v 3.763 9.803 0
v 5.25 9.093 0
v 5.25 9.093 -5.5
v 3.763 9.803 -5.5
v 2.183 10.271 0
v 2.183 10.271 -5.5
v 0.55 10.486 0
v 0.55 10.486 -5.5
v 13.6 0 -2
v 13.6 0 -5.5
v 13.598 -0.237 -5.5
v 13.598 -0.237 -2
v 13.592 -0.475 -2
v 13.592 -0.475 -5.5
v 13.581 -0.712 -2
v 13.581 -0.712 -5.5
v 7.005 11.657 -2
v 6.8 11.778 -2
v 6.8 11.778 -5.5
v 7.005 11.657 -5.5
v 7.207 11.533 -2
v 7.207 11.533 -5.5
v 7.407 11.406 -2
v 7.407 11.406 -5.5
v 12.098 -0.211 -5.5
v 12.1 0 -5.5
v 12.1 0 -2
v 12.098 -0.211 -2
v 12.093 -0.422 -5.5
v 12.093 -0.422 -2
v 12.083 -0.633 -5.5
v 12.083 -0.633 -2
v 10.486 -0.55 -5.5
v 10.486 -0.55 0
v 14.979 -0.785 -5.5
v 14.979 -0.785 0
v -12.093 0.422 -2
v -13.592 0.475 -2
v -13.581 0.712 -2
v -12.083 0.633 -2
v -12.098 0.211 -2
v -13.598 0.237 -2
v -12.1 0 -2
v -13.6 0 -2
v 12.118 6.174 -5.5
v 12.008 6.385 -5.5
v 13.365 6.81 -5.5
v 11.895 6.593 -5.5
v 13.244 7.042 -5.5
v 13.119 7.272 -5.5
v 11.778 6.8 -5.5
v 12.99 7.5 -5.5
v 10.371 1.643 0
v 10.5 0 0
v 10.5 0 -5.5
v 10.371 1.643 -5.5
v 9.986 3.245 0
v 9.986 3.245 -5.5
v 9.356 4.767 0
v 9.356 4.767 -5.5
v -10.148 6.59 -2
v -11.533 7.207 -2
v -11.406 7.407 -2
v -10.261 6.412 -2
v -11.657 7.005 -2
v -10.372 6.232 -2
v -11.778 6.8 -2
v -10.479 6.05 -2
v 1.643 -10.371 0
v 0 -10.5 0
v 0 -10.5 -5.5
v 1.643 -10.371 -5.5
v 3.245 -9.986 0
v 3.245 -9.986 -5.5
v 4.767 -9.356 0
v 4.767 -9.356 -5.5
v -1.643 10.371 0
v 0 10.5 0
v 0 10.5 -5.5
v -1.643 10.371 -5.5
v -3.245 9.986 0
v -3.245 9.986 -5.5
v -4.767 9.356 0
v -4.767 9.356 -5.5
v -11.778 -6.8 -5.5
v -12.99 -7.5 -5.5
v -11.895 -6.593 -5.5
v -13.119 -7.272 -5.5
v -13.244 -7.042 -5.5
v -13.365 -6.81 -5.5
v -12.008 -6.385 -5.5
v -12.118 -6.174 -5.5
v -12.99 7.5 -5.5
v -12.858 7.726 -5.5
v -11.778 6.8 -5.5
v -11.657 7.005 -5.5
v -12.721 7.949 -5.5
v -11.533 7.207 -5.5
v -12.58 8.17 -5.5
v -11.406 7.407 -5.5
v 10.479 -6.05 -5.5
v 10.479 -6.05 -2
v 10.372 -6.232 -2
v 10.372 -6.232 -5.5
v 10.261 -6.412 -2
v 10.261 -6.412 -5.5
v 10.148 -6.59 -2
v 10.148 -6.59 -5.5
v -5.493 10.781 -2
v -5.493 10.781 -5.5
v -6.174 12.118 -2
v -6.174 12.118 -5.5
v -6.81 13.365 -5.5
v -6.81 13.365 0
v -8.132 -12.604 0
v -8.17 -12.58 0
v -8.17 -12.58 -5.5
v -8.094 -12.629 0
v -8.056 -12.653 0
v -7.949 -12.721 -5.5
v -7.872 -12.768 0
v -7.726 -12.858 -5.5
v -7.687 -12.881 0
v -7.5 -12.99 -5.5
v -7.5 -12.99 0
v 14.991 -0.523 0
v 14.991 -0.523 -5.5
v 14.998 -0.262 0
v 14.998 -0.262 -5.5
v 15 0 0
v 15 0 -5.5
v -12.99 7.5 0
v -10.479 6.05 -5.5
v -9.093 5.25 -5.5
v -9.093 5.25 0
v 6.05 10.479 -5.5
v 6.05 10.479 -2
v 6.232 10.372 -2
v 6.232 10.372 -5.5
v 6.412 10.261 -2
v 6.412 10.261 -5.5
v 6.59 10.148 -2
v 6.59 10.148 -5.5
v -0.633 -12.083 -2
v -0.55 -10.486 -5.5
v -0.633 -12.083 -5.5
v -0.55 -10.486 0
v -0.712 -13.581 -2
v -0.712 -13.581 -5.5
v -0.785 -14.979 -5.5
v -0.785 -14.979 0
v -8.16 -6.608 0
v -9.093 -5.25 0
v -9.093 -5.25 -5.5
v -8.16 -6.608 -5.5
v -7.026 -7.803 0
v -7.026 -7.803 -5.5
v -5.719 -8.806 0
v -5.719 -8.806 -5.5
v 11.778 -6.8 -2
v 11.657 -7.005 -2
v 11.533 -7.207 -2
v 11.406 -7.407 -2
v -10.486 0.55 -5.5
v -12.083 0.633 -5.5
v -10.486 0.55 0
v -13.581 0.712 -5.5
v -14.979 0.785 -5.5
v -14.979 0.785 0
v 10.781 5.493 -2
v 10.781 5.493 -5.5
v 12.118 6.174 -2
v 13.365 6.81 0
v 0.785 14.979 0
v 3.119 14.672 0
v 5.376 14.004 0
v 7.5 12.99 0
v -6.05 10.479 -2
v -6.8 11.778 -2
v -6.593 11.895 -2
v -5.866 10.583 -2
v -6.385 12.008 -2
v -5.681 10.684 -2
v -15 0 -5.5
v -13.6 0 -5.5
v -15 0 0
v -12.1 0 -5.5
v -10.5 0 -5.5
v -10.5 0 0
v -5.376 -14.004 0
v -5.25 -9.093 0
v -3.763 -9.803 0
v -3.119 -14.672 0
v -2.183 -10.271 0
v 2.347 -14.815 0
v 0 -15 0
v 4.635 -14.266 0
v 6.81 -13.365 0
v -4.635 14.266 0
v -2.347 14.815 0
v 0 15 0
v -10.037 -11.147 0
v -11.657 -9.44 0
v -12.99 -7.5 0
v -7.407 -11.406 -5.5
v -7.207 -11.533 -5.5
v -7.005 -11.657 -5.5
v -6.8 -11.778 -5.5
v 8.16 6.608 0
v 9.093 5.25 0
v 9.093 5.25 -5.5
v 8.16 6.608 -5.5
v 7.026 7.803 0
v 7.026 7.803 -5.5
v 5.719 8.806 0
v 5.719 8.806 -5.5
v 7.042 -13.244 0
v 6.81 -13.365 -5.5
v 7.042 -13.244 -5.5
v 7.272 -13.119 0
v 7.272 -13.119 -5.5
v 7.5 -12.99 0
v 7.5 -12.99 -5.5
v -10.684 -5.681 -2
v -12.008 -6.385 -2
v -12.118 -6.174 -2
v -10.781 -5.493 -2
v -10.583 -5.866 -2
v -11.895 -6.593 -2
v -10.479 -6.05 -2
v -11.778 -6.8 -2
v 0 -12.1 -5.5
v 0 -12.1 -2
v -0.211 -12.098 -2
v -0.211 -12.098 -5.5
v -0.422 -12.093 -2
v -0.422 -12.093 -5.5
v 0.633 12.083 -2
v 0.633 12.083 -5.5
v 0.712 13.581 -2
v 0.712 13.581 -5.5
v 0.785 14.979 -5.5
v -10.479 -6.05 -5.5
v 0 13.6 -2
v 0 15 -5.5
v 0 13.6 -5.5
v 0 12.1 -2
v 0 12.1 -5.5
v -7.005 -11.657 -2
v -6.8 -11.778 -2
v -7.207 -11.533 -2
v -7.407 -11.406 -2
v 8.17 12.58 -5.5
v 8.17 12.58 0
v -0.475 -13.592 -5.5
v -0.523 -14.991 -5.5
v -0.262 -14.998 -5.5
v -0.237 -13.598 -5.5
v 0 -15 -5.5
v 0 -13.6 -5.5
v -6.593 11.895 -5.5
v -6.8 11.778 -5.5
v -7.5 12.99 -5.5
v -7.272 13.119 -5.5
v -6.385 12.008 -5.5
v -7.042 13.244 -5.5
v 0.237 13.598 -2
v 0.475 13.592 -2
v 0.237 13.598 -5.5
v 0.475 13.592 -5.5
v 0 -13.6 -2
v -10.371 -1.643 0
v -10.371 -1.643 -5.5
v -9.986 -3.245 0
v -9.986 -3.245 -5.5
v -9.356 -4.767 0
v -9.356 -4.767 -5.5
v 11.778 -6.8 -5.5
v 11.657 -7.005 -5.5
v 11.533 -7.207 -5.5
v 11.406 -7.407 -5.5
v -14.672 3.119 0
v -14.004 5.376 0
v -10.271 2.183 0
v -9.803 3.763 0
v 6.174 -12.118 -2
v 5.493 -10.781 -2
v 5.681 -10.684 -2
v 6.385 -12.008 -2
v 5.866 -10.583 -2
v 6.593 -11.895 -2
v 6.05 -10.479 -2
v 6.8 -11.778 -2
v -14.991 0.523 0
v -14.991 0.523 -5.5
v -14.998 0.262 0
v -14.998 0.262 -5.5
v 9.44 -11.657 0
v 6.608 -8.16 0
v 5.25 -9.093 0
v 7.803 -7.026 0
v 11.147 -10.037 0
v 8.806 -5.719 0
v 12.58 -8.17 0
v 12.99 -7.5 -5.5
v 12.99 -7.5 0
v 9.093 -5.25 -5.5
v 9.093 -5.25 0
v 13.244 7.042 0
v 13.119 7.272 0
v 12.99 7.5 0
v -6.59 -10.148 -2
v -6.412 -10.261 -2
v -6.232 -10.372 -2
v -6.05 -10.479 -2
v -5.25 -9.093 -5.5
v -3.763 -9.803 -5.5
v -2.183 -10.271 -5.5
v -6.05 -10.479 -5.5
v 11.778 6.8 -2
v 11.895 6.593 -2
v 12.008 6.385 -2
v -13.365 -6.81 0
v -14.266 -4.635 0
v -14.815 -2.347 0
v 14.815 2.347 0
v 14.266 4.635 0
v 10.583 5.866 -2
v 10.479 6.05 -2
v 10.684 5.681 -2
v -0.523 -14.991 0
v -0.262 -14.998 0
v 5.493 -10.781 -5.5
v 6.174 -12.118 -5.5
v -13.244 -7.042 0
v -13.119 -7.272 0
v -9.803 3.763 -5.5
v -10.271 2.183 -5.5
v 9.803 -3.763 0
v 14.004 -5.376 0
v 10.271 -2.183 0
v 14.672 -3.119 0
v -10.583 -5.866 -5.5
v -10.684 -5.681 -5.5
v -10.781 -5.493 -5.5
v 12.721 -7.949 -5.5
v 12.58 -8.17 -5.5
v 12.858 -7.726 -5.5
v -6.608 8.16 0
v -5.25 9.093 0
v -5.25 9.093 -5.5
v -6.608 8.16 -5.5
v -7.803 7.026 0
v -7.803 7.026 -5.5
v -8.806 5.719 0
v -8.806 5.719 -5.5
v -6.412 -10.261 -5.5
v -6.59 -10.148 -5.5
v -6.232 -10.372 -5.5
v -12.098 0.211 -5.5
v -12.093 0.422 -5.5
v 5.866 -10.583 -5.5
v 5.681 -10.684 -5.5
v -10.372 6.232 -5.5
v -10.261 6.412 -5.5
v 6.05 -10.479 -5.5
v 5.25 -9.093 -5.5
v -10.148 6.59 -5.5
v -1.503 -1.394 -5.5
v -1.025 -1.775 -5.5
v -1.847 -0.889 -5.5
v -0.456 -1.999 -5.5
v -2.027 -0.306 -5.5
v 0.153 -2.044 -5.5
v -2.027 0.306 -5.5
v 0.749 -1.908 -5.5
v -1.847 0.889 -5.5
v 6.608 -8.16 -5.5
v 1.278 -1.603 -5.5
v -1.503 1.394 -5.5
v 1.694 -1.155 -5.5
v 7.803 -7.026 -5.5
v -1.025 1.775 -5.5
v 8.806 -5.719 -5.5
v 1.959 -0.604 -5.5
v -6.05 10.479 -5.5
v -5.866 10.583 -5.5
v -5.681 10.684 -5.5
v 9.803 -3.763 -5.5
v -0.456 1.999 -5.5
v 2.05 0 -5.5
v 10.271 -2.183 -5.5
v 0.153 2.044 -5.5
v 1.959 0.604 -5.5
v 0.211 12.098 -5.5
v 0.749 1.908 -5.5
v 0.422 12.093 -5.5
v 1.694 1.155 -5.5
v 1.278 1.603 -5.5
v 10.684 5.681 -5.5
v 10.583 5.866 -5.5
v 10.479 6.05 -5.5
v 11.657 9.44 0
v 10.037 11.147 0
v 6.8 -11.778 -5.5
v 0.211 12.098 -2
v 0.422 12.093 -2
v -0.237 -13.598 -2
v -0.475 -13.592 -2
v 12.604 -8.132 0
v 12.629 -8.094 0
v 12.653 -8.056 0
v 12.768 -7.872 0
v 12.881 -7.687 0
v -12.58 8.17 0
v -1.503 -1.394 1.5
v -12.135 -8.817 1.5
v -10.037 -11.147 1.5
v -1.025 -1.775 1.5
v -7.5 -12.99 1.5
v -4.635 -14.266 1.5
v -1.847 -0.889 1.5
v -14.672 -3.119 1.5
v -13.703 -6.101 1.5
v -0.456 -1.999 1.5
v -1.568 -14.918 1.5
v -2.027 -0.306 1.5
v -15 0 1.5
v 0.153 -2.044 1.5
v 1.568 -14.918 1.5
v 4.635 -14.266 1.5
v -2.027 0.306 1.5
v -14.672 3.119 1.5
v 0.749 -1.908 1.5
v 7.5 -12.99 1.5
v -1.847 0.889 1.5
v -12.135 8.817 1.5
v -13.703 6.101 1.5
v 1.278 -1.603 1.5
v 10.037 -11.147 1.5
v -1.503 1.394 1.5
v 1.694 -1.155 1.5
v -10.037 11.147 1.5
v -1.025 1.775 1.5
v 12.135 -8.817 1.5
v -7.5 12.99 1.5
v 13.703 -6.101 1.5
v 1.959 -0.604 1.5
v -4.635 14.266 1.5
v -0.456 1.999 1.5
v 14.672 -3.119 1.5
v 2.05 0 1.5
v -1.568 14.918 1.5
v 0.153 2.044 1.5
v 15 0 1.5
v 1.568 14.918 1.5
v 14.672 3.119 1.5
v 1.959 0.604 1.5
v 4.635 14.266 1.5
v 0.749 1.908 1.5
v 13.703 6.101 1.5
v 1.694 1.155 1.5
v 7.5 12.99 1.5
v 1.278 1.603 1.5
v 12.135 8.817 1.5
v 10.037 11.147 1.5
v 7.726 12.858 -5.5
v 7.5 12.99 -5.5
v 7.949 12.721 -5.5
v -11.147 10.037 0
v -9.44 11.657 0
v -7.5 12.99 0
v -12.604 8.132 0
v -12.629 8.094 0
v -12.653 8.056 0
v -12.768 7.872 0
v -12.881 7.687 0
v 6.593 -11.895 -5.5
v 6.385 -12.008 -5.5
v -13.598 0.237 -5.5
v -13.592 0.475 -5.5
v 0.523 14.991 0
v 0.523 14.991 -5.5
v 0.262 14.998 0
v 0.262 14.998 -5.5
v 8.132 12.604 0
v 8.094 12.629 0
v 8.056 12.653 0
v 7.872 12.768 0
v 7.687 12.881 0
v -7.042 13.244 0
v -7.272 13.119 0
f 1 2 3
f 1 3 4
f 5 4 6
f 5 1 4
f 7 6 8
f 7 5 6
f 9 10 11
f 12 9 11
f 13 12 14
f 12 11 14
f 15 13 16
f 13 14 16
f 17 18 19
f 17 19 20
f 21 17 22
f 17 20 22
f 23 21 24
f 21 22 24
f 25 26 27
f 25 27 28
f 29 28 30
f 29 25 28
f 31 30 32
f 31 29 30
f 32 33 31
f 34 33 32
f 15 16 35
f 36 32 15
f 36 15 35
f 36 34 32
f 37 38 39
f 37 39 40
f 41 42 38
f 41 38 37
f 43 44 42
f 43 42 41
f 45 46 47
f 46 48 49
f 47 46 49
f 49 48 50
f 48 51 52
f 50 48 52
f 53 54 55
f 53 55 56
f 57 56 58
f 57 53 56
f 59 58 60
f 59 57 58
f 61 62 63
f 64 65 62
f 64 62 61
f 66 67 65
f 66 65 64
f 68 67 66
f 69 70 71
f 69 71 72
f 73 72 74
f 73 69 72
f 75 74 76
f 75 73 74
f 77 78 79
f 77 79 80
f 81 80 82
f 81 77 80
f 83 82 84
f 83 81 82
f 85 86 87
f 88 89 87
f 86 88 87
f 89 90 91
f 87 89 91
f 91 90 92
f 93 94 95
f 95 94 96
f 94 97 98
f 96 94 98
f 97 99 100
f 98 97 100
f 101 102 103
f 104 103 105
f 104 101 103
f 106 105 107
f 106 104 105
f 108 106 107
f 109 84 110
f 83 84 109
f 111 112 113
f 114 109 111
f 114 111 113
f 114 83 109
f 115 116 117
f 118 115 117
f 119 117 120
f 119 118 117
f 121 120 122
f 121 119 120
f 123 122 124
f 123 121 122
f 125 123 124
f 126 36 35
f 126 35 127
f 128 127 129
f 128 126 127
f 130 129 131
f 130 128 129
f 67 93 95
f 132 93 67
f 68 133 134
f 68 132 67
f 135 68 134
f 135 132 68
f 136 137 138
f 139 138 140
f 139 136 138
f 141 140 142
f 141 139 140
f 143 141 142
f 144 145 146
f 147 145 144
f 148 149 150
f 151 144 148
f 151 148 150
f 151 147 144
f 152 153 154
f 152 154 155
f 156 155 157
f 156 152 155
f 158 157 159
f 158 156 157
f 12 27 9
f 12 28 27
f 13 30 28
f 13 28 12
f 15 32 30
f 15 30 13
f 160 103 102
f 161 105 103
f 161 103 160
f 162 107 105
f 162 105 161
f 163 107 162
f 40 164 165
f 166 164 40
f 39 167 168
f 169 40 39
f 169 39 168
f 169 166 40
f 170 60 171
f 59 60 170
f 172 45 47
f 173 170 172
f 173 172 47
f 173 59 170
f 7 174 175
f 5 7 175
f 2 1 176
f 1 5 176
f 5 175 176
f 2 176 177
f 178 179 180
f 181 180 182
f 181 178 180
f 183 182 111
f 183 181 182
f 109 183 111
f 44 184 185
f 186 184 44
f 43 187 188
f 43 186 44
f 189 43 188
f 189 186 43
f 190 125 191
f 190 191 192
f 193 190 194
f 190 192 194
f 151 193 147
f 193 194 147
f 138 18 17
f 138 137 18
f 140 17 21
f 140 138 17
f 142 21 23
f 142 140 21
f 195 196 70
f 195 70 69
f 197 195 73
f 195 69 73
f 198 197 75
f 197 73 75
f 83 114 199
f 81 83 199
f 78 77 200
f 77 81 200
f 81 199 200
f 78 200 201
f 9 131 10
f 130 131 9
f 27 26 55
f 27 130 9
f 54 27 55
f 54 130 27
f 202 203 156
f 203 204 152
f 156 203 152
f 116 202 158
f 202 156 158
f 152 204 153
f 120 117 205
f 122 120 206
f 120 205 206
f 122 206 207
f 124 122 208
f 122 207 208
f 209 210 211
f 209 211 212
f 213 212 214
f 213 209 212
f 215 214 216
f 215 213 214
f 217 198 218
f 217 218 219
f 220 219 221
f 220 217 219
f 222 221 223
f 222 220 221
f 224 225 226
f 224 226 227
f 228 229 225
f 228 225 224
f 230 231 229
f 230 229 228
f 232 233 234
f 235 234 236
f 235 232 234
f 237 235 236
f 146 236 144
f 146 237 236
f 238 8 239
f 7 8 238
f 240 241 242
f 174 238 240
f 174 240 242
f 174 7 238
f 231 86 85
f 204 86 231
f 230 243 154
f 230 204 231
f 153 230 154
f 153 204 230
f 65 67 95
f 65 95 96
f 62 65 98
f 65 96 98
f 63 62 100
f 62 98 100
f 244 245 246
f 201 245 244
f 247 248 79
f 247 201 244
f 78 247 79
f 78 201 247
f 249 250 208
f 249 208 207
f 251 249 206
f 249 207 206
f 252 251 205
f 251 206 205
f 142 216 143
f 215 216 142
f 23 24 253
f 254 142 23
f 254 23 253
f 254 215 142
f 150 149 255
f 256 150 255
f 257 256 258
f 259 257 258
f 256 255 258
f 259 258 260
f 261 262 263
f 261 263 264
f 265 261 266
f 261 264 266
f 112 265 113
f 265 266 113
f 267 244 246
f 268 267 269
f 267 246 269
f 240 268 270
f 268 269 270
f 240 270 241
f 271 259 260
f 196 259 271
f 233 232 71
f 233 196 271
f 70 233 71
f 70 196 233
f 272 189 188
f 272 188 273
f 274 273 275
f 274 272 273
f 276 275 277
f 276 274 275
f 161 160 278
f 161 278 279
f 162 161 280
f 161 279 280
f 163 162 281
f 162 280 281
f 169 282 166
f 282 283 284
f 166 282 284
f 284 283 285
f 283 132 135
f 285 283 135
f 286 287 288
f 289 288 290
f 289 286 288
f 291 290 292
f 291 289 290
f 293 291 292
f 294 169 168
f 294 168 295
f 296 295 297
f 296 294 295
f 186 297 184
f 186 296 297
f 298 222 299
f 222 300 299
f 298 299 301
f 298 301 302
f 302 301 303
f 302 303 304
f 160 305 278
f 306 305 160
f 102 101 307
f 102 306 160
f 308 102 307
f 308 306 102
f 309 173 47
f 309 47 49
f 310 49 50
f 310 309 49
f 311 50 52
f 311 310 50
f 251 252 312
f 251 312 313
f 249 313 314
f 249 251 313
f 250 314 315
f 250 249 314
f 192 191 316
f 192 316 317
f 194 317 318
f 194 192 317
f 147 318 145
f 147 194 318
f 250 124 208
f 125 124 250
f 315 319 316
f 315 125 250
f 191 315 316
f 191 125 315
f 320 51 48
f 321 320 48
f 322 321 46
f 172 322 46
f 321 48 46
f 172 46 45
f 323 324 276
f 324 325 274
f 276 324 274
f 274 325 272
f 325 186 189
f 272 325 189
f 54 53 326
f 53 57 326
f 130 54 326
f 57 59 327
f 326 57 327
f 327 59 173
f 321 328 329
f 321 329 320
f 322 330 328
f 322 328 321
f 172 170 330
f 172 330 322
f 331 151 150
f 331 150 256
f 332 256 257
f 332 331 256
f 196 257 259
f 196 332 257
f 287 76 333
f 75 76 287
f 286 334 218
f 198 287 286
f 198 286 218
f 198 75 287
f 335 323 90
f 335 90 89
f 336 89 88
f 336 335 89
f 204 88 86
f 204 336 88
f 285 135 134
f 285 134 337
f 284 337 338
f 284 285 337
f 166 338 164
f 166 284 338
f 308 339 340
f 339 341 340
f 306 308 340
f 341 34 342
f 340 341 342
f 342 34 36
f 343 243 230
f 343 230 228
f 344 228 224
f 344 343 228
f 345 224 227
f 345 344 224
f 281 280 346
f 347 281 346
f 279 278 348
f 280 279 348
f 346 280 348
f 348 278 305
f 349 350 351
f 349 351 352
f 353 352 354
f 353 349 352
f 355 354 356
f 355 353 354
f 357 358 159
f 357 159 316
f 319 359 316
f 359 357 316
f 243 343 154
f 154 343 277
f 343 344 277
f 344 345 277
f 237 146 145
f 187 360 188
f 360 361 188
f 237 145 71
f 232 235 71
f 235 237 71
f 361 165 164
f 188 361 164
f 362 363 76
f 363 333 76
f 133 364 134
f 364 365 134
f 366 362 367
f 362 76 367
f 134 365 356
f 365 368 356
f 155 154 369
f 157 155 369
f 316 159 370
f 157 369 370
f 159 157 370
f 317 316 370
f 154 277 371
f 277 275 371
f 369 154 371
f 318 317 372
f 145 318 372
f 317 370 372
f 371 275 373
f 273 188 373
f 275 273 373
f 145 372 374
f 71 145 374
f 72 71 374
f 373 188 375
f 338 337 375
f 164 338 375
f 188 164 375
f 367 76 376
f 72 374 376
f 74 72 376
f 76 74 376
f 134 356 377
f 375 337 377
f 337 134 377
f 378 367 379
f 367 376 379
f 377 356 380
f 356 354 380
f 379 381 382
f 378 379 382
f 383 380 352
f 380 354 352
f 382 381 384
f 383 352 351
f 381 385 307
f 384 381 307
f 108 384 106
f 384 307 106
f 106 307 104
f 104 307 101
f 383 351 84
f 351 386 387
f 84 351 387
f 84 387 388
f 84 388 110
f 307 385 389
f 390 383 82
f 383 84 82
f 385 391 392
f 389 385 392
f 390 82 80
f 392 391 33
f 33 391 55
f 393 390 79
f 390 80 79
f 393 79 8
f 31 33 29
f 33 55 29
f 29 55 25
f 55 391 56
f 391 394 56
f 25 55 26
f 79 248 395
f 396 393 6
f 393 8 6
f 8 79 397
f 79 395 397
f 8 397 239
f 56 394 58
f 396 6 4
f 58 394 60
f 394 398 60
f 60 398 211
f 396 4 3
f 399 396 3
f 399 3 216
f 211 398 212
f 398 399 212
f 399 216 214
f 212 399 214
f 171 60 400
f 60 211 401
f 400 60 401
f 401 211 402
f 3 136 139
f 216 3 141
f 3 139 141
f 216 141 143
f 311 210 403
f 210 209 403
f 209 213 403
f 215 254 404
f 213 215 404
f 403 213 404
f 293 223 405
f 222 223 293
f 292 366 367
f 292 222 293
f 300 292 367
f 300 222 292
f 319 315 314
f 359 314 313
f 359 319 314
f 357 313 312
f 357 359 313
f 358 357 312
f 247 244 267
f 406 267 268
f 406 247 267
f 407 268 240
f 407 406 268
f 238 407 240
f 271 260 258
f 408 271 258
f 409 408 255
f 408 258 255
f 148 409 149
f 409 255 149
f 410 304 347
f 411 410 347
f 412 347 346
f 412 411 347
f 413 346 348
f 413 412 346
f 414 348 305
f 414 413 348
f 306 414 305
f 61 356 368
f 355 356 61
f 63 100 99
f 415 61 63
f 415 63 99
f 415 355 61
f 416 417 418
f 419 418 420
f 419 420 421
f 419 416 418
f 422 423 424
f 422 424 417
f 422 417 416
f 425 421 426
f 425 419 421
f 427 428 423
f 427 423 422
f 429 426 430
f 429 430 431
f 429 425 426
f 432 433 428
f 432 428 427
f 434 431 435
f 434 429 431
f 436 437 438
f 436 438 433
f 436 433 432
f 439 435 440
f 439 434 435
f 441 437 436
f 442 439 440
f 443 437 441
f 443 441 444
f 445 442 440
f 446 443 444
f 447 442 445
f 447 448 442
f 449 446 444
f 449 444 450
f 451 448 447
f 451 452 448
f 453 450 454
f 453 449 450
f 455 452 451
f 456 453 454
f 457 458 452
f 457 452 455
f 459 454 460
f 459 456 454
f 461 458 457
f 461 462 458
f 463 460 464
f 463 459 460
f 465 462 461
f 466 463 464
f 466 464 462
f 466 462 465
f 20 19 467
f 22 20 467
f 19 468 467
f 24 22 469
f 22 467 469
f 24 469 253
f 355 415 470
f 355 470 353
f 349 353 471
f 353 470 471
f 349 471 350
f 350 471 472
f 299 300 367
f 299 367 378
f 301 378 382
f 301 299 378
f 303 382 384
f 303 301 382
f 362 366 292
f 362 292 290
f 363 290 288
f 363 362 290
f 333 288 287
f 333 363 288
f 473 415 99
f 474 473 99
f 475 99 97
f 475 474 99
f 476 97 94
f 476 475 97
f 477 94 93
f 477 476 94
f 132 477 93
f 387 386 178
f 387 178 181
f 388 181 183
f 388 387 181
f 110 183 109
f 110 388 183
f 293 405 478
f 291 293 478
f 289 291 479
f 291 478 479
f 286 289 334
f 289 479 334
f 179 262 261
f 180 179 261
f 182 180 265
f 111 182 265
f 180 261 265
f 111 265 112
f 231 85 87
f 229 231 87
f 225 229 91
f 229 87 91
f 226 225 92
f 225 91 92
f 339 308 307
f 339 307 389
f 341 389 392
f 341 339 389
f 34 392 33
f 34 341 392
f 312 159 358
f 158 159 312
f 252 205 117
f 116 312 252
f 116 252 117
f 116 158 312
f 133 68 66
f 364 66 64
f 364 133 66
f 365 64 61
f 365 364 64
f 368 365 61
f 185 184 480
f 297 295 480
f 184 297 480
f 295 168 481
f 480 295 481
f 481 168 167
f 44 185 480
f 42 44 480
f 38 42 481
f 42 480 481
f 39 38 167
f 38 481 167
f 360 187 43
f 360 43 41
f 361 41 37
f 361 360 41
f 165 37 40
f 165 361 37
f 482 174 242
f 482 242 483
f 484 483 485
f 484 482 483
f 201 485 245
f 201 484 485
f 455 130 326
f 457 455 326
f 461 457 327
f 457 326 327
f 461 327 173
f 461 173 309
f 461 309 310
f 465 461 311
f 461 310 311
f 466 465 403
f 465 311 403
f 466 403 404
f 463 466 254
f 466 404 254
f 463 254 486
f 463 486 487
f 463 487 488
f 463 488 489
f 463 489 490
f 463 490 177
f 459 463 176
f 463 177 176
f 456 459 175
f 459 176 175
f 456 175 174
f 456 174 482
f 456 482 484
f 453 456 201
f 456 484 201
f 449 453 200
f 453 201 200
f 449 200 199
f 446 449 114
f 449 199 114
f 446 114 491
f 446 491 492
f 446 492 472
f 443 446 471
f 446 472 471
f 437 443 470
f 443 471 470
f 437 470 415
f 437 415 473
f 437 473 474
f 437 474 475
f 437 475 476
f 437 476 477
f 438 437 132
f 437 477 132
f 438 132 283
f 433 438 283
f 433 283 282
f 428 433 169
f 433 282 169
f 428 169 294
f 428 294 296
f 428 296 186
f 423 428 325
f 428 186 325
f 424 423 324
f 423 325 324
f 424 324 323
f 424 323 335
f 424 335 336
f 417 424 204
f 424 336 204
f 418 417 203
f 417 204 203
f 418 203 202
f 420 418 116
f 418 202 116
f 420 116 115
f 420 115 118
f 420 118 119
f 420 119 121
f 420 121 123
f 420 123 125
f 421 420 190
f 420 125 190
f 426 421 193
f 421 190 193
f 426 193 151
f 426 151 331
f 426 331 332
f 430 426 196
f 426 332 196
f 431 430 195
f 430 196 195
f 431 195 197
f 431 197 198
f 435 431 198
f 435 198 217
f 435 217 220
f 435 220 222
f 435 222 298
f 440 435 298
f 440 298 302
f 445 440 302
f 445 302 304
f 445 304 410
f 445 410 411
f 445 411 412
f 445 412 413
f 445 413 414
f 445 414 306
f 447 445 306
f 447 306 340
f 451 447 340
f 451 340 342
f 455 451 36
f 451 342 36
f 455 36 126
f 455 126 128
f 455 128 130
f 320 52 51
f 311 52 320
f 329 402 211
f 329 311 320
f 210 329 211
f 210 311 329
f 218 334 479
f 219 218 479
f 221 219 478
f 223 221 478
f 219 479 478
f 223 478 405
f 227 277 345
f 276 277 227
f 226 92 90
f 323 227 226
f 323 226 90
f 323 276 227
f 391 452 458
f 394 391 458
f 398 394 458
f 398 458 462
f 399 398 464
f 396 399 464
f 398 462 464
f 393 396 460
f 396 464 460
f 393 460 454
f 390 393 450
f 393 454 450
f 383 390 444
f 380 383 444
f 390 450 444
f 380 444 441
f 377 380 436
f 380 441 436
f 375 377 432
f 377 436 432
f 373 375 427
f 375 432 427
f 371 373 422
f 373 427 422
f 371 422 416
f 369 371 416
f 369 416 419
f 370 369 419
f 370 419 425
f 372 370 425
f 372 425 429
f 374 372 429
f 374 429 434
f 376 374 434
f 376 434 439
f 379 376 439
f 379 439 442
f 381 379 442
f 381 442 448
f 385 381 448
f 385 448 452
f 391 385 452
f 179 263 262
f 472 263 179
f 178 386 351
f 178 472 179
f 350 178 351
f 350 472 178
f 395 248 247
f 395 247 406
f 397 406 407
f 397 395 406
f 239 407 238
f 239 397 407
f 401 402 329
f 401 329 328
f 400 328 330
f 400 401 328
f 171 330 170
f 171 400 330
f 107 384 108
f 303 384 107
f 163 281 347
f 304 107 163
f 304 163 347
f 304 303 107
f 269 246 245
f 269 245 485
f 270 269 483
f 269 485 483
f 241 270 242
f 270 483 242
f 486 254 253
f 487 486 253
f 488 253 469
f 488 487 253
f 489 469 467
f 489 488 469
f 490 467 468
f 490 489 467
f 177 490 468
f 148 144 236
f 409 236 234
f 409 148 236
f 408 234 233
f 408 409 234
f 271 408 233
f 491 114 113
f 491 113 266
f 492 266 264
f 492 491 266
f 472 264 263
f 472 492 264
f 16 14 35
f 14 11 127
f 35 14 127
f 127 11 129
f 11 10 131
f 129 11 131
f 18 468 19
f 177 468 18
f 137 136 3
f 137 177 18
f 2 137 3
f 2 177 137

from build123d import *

# Parameters (mm, degrees)
F1_DEPTH = 5.5
F2_R     = 15
F3_DEPTH = 1.5
F4_R     = 13.6
F4_R_2   = 12.1
F5_DEPTH = 3.5
F6_R     = 2.05
F7_DEPTH = 7.001


with BuildPart() as f1:
    # F0 (on Top) → F1 (new body)
    with BuildSketch(Plane.XY):
        with BuildLine():
            Line((8.806041, -5.71871), (12.580059, -8.169586))
            ThreePointArc((12.580059, -8.169586), (12.789602, -7.837478), (12.990381, -7.5))
            Line((12.990381, -7.5), (9.093267, -5.25))
            ThreePointArc((9.093267, -5.25), (10.067607, -2.982161), (10.48561, -0.549528))
            Line((10.48561, -0.549528), (14.979443, -0.785039))
            ThreePointArc((14.979443, -0.785039), (14.99486, -0.392654), (15, 0))
            Line((15, 0), (10.5, 0))
            ThreePointArc((10.5, 0), (10.209884, 2.451176), (9.355569, 4.7669))
            Line((9.355569, 4.7669), (13.365098, 6.809857))
            ThreePointArc((13.365098, 6.809857), (13.182257, 7.157381), (12.990381, 7.5))
            Line((12.990381, 7.5), (9.093267, 5.25))
            ThreePointArc((9.093267, 5.25), (7.616431, 7.227723), (5.71871, 8.806041))
            Line((5.71871, 8.806041), (8.169586, 12.580059))
            ThreePointArc((8.169586, 12.580059), (7.837478, 12.789602), (7.5, 12.990381))
            Line((7.5, 12.990381), (5.25, 9.093267))
            ThreePointArc((5.25, 9.093267), (2.982161, 10.067607), (0.549528, 10.48561))
            Line((0.549528, 10.48561), (0.785039, 14.979443))
            ThreePointArc((0.785039, 14.979443), (0.392654, 14.99486), (0, 15))
            Line((0, 15), (0, 10.5))
            ThreePointArc((0, 10.5), (-2.451176, 10.209884), (-4.7669, 9.355569))
            Line((-4.7669, 9.355569), (-6.809857, 13.365098))
            ThreePointArc((-6.809857, 13.365098), (-7.157381, 13.182257), (-7.5, 12.990381))
            Line((-7.5, 12.990381), (-5.25, 9.093267))
            ThreePointArc((-5.25, 9.093267), (-7.227723, 7.616431), (-8.806041, 5.71871))
            Line((-8.806041, 5.71871), (-12.580059, 8.169586))
            ThreePointArc((-12.580059, 8.169586), (-12.789602, 7.837478), (-12.990381, 7.5))
            Line((-12.990381, 7.5), (-9.093267, 5.25))
            ThreePointArc((-9.093267, 5.25), (-10.067607, 2.982161), (-10.48561, 0.549528))
            Line((-10.48561, 0.549528), (-14.979443, 0.785039))
            ThreePointArc((-14.979443, 0.785039), (-14.99486, 0.392654), (-15, 0))
            Line((-15, 0), (-10.5, 0))
            ThreePointArc((-10.5, 0), (-10.209884, -2.451176), (-9.355569, -4.7669))
            Line((-9.355569, -4.7669), (-13.365098, -6.809857))
            ThreePointArc((-13.365098, -6.809857), (-13.182257, -7.157381), (-12.990381, -7.5))
            Line((-12.990381, -7.5), (-9.093267, -5.25))
            ThreePointArc((-9.093267, -5.25), (-7.616431, -7.227723), (-5.71871, -8.806041))
            Line((-5.71871, -8.806041), (-8.169586, -12.580059))
            ThreePointArc((-8.169586, -12.580059), (-7.837478, -12.789602), (-7.5, -12.990381))
            Line((-7.5, -12.990381), (-5.25, -9.093267))
            ThreePointArc((-5.25, -9.093267), (-2.982161, -10.067607), (-0.549528, -10.48561))
            Line((-0.549528, -10.48561), (-0.785039, -14.979443))
            ThreePointArc((-0.785039, -14.979443), (-0.392654, -14.99486), (0, -15))
            Line((0, -15), (0, -10.5))
            ThreePointArc((0, -10.5), (2.451176, -10.209884), (4.7669, -9.355569))
            Line((4.7669, -9.355569), (6.809857, -13.365098))
            ThreePointArc((6.809857, -13.365098), (7.157381, -13.182257), (7.5, -12.990381))
            Line((7.5, -12.990381), (5.25, -9.093267))
            ThreePointArc((5.25, -9.093267), (7.227723, -7.616431), (8.806041, -5.71871))
        make_face()
    extrude(amount=-F1_DEPTH)

    # F2 (on face) → F3 (join)
    with BuildSketch(Plane.XY):
        Circle(F2_R)
    extrude(amount=F3_DEPTH)

    # F4 (on face) → F5 (cut)
    with BuildSketch(Plane(origin=(0, 0, -5.5), x_dir=(1, 0, 0), z_dir=(0, 0, -1))):
        Circle(F4_R)
        Circle(F4_R_2, mode=Mode.SUBTRACT)
    extrude(amount=-F5_DEPTH, mode=Mode.SUBTRACT)

    # F6 (on face) → F7 (cut, through all)
    with BuildSketch(Plane.XY.offset(1.5)):
        Circle(F6_R)
    extrude(amount=-F7_DEPTH, mode=Mode.SUBTRACT)


solid = f1.part
